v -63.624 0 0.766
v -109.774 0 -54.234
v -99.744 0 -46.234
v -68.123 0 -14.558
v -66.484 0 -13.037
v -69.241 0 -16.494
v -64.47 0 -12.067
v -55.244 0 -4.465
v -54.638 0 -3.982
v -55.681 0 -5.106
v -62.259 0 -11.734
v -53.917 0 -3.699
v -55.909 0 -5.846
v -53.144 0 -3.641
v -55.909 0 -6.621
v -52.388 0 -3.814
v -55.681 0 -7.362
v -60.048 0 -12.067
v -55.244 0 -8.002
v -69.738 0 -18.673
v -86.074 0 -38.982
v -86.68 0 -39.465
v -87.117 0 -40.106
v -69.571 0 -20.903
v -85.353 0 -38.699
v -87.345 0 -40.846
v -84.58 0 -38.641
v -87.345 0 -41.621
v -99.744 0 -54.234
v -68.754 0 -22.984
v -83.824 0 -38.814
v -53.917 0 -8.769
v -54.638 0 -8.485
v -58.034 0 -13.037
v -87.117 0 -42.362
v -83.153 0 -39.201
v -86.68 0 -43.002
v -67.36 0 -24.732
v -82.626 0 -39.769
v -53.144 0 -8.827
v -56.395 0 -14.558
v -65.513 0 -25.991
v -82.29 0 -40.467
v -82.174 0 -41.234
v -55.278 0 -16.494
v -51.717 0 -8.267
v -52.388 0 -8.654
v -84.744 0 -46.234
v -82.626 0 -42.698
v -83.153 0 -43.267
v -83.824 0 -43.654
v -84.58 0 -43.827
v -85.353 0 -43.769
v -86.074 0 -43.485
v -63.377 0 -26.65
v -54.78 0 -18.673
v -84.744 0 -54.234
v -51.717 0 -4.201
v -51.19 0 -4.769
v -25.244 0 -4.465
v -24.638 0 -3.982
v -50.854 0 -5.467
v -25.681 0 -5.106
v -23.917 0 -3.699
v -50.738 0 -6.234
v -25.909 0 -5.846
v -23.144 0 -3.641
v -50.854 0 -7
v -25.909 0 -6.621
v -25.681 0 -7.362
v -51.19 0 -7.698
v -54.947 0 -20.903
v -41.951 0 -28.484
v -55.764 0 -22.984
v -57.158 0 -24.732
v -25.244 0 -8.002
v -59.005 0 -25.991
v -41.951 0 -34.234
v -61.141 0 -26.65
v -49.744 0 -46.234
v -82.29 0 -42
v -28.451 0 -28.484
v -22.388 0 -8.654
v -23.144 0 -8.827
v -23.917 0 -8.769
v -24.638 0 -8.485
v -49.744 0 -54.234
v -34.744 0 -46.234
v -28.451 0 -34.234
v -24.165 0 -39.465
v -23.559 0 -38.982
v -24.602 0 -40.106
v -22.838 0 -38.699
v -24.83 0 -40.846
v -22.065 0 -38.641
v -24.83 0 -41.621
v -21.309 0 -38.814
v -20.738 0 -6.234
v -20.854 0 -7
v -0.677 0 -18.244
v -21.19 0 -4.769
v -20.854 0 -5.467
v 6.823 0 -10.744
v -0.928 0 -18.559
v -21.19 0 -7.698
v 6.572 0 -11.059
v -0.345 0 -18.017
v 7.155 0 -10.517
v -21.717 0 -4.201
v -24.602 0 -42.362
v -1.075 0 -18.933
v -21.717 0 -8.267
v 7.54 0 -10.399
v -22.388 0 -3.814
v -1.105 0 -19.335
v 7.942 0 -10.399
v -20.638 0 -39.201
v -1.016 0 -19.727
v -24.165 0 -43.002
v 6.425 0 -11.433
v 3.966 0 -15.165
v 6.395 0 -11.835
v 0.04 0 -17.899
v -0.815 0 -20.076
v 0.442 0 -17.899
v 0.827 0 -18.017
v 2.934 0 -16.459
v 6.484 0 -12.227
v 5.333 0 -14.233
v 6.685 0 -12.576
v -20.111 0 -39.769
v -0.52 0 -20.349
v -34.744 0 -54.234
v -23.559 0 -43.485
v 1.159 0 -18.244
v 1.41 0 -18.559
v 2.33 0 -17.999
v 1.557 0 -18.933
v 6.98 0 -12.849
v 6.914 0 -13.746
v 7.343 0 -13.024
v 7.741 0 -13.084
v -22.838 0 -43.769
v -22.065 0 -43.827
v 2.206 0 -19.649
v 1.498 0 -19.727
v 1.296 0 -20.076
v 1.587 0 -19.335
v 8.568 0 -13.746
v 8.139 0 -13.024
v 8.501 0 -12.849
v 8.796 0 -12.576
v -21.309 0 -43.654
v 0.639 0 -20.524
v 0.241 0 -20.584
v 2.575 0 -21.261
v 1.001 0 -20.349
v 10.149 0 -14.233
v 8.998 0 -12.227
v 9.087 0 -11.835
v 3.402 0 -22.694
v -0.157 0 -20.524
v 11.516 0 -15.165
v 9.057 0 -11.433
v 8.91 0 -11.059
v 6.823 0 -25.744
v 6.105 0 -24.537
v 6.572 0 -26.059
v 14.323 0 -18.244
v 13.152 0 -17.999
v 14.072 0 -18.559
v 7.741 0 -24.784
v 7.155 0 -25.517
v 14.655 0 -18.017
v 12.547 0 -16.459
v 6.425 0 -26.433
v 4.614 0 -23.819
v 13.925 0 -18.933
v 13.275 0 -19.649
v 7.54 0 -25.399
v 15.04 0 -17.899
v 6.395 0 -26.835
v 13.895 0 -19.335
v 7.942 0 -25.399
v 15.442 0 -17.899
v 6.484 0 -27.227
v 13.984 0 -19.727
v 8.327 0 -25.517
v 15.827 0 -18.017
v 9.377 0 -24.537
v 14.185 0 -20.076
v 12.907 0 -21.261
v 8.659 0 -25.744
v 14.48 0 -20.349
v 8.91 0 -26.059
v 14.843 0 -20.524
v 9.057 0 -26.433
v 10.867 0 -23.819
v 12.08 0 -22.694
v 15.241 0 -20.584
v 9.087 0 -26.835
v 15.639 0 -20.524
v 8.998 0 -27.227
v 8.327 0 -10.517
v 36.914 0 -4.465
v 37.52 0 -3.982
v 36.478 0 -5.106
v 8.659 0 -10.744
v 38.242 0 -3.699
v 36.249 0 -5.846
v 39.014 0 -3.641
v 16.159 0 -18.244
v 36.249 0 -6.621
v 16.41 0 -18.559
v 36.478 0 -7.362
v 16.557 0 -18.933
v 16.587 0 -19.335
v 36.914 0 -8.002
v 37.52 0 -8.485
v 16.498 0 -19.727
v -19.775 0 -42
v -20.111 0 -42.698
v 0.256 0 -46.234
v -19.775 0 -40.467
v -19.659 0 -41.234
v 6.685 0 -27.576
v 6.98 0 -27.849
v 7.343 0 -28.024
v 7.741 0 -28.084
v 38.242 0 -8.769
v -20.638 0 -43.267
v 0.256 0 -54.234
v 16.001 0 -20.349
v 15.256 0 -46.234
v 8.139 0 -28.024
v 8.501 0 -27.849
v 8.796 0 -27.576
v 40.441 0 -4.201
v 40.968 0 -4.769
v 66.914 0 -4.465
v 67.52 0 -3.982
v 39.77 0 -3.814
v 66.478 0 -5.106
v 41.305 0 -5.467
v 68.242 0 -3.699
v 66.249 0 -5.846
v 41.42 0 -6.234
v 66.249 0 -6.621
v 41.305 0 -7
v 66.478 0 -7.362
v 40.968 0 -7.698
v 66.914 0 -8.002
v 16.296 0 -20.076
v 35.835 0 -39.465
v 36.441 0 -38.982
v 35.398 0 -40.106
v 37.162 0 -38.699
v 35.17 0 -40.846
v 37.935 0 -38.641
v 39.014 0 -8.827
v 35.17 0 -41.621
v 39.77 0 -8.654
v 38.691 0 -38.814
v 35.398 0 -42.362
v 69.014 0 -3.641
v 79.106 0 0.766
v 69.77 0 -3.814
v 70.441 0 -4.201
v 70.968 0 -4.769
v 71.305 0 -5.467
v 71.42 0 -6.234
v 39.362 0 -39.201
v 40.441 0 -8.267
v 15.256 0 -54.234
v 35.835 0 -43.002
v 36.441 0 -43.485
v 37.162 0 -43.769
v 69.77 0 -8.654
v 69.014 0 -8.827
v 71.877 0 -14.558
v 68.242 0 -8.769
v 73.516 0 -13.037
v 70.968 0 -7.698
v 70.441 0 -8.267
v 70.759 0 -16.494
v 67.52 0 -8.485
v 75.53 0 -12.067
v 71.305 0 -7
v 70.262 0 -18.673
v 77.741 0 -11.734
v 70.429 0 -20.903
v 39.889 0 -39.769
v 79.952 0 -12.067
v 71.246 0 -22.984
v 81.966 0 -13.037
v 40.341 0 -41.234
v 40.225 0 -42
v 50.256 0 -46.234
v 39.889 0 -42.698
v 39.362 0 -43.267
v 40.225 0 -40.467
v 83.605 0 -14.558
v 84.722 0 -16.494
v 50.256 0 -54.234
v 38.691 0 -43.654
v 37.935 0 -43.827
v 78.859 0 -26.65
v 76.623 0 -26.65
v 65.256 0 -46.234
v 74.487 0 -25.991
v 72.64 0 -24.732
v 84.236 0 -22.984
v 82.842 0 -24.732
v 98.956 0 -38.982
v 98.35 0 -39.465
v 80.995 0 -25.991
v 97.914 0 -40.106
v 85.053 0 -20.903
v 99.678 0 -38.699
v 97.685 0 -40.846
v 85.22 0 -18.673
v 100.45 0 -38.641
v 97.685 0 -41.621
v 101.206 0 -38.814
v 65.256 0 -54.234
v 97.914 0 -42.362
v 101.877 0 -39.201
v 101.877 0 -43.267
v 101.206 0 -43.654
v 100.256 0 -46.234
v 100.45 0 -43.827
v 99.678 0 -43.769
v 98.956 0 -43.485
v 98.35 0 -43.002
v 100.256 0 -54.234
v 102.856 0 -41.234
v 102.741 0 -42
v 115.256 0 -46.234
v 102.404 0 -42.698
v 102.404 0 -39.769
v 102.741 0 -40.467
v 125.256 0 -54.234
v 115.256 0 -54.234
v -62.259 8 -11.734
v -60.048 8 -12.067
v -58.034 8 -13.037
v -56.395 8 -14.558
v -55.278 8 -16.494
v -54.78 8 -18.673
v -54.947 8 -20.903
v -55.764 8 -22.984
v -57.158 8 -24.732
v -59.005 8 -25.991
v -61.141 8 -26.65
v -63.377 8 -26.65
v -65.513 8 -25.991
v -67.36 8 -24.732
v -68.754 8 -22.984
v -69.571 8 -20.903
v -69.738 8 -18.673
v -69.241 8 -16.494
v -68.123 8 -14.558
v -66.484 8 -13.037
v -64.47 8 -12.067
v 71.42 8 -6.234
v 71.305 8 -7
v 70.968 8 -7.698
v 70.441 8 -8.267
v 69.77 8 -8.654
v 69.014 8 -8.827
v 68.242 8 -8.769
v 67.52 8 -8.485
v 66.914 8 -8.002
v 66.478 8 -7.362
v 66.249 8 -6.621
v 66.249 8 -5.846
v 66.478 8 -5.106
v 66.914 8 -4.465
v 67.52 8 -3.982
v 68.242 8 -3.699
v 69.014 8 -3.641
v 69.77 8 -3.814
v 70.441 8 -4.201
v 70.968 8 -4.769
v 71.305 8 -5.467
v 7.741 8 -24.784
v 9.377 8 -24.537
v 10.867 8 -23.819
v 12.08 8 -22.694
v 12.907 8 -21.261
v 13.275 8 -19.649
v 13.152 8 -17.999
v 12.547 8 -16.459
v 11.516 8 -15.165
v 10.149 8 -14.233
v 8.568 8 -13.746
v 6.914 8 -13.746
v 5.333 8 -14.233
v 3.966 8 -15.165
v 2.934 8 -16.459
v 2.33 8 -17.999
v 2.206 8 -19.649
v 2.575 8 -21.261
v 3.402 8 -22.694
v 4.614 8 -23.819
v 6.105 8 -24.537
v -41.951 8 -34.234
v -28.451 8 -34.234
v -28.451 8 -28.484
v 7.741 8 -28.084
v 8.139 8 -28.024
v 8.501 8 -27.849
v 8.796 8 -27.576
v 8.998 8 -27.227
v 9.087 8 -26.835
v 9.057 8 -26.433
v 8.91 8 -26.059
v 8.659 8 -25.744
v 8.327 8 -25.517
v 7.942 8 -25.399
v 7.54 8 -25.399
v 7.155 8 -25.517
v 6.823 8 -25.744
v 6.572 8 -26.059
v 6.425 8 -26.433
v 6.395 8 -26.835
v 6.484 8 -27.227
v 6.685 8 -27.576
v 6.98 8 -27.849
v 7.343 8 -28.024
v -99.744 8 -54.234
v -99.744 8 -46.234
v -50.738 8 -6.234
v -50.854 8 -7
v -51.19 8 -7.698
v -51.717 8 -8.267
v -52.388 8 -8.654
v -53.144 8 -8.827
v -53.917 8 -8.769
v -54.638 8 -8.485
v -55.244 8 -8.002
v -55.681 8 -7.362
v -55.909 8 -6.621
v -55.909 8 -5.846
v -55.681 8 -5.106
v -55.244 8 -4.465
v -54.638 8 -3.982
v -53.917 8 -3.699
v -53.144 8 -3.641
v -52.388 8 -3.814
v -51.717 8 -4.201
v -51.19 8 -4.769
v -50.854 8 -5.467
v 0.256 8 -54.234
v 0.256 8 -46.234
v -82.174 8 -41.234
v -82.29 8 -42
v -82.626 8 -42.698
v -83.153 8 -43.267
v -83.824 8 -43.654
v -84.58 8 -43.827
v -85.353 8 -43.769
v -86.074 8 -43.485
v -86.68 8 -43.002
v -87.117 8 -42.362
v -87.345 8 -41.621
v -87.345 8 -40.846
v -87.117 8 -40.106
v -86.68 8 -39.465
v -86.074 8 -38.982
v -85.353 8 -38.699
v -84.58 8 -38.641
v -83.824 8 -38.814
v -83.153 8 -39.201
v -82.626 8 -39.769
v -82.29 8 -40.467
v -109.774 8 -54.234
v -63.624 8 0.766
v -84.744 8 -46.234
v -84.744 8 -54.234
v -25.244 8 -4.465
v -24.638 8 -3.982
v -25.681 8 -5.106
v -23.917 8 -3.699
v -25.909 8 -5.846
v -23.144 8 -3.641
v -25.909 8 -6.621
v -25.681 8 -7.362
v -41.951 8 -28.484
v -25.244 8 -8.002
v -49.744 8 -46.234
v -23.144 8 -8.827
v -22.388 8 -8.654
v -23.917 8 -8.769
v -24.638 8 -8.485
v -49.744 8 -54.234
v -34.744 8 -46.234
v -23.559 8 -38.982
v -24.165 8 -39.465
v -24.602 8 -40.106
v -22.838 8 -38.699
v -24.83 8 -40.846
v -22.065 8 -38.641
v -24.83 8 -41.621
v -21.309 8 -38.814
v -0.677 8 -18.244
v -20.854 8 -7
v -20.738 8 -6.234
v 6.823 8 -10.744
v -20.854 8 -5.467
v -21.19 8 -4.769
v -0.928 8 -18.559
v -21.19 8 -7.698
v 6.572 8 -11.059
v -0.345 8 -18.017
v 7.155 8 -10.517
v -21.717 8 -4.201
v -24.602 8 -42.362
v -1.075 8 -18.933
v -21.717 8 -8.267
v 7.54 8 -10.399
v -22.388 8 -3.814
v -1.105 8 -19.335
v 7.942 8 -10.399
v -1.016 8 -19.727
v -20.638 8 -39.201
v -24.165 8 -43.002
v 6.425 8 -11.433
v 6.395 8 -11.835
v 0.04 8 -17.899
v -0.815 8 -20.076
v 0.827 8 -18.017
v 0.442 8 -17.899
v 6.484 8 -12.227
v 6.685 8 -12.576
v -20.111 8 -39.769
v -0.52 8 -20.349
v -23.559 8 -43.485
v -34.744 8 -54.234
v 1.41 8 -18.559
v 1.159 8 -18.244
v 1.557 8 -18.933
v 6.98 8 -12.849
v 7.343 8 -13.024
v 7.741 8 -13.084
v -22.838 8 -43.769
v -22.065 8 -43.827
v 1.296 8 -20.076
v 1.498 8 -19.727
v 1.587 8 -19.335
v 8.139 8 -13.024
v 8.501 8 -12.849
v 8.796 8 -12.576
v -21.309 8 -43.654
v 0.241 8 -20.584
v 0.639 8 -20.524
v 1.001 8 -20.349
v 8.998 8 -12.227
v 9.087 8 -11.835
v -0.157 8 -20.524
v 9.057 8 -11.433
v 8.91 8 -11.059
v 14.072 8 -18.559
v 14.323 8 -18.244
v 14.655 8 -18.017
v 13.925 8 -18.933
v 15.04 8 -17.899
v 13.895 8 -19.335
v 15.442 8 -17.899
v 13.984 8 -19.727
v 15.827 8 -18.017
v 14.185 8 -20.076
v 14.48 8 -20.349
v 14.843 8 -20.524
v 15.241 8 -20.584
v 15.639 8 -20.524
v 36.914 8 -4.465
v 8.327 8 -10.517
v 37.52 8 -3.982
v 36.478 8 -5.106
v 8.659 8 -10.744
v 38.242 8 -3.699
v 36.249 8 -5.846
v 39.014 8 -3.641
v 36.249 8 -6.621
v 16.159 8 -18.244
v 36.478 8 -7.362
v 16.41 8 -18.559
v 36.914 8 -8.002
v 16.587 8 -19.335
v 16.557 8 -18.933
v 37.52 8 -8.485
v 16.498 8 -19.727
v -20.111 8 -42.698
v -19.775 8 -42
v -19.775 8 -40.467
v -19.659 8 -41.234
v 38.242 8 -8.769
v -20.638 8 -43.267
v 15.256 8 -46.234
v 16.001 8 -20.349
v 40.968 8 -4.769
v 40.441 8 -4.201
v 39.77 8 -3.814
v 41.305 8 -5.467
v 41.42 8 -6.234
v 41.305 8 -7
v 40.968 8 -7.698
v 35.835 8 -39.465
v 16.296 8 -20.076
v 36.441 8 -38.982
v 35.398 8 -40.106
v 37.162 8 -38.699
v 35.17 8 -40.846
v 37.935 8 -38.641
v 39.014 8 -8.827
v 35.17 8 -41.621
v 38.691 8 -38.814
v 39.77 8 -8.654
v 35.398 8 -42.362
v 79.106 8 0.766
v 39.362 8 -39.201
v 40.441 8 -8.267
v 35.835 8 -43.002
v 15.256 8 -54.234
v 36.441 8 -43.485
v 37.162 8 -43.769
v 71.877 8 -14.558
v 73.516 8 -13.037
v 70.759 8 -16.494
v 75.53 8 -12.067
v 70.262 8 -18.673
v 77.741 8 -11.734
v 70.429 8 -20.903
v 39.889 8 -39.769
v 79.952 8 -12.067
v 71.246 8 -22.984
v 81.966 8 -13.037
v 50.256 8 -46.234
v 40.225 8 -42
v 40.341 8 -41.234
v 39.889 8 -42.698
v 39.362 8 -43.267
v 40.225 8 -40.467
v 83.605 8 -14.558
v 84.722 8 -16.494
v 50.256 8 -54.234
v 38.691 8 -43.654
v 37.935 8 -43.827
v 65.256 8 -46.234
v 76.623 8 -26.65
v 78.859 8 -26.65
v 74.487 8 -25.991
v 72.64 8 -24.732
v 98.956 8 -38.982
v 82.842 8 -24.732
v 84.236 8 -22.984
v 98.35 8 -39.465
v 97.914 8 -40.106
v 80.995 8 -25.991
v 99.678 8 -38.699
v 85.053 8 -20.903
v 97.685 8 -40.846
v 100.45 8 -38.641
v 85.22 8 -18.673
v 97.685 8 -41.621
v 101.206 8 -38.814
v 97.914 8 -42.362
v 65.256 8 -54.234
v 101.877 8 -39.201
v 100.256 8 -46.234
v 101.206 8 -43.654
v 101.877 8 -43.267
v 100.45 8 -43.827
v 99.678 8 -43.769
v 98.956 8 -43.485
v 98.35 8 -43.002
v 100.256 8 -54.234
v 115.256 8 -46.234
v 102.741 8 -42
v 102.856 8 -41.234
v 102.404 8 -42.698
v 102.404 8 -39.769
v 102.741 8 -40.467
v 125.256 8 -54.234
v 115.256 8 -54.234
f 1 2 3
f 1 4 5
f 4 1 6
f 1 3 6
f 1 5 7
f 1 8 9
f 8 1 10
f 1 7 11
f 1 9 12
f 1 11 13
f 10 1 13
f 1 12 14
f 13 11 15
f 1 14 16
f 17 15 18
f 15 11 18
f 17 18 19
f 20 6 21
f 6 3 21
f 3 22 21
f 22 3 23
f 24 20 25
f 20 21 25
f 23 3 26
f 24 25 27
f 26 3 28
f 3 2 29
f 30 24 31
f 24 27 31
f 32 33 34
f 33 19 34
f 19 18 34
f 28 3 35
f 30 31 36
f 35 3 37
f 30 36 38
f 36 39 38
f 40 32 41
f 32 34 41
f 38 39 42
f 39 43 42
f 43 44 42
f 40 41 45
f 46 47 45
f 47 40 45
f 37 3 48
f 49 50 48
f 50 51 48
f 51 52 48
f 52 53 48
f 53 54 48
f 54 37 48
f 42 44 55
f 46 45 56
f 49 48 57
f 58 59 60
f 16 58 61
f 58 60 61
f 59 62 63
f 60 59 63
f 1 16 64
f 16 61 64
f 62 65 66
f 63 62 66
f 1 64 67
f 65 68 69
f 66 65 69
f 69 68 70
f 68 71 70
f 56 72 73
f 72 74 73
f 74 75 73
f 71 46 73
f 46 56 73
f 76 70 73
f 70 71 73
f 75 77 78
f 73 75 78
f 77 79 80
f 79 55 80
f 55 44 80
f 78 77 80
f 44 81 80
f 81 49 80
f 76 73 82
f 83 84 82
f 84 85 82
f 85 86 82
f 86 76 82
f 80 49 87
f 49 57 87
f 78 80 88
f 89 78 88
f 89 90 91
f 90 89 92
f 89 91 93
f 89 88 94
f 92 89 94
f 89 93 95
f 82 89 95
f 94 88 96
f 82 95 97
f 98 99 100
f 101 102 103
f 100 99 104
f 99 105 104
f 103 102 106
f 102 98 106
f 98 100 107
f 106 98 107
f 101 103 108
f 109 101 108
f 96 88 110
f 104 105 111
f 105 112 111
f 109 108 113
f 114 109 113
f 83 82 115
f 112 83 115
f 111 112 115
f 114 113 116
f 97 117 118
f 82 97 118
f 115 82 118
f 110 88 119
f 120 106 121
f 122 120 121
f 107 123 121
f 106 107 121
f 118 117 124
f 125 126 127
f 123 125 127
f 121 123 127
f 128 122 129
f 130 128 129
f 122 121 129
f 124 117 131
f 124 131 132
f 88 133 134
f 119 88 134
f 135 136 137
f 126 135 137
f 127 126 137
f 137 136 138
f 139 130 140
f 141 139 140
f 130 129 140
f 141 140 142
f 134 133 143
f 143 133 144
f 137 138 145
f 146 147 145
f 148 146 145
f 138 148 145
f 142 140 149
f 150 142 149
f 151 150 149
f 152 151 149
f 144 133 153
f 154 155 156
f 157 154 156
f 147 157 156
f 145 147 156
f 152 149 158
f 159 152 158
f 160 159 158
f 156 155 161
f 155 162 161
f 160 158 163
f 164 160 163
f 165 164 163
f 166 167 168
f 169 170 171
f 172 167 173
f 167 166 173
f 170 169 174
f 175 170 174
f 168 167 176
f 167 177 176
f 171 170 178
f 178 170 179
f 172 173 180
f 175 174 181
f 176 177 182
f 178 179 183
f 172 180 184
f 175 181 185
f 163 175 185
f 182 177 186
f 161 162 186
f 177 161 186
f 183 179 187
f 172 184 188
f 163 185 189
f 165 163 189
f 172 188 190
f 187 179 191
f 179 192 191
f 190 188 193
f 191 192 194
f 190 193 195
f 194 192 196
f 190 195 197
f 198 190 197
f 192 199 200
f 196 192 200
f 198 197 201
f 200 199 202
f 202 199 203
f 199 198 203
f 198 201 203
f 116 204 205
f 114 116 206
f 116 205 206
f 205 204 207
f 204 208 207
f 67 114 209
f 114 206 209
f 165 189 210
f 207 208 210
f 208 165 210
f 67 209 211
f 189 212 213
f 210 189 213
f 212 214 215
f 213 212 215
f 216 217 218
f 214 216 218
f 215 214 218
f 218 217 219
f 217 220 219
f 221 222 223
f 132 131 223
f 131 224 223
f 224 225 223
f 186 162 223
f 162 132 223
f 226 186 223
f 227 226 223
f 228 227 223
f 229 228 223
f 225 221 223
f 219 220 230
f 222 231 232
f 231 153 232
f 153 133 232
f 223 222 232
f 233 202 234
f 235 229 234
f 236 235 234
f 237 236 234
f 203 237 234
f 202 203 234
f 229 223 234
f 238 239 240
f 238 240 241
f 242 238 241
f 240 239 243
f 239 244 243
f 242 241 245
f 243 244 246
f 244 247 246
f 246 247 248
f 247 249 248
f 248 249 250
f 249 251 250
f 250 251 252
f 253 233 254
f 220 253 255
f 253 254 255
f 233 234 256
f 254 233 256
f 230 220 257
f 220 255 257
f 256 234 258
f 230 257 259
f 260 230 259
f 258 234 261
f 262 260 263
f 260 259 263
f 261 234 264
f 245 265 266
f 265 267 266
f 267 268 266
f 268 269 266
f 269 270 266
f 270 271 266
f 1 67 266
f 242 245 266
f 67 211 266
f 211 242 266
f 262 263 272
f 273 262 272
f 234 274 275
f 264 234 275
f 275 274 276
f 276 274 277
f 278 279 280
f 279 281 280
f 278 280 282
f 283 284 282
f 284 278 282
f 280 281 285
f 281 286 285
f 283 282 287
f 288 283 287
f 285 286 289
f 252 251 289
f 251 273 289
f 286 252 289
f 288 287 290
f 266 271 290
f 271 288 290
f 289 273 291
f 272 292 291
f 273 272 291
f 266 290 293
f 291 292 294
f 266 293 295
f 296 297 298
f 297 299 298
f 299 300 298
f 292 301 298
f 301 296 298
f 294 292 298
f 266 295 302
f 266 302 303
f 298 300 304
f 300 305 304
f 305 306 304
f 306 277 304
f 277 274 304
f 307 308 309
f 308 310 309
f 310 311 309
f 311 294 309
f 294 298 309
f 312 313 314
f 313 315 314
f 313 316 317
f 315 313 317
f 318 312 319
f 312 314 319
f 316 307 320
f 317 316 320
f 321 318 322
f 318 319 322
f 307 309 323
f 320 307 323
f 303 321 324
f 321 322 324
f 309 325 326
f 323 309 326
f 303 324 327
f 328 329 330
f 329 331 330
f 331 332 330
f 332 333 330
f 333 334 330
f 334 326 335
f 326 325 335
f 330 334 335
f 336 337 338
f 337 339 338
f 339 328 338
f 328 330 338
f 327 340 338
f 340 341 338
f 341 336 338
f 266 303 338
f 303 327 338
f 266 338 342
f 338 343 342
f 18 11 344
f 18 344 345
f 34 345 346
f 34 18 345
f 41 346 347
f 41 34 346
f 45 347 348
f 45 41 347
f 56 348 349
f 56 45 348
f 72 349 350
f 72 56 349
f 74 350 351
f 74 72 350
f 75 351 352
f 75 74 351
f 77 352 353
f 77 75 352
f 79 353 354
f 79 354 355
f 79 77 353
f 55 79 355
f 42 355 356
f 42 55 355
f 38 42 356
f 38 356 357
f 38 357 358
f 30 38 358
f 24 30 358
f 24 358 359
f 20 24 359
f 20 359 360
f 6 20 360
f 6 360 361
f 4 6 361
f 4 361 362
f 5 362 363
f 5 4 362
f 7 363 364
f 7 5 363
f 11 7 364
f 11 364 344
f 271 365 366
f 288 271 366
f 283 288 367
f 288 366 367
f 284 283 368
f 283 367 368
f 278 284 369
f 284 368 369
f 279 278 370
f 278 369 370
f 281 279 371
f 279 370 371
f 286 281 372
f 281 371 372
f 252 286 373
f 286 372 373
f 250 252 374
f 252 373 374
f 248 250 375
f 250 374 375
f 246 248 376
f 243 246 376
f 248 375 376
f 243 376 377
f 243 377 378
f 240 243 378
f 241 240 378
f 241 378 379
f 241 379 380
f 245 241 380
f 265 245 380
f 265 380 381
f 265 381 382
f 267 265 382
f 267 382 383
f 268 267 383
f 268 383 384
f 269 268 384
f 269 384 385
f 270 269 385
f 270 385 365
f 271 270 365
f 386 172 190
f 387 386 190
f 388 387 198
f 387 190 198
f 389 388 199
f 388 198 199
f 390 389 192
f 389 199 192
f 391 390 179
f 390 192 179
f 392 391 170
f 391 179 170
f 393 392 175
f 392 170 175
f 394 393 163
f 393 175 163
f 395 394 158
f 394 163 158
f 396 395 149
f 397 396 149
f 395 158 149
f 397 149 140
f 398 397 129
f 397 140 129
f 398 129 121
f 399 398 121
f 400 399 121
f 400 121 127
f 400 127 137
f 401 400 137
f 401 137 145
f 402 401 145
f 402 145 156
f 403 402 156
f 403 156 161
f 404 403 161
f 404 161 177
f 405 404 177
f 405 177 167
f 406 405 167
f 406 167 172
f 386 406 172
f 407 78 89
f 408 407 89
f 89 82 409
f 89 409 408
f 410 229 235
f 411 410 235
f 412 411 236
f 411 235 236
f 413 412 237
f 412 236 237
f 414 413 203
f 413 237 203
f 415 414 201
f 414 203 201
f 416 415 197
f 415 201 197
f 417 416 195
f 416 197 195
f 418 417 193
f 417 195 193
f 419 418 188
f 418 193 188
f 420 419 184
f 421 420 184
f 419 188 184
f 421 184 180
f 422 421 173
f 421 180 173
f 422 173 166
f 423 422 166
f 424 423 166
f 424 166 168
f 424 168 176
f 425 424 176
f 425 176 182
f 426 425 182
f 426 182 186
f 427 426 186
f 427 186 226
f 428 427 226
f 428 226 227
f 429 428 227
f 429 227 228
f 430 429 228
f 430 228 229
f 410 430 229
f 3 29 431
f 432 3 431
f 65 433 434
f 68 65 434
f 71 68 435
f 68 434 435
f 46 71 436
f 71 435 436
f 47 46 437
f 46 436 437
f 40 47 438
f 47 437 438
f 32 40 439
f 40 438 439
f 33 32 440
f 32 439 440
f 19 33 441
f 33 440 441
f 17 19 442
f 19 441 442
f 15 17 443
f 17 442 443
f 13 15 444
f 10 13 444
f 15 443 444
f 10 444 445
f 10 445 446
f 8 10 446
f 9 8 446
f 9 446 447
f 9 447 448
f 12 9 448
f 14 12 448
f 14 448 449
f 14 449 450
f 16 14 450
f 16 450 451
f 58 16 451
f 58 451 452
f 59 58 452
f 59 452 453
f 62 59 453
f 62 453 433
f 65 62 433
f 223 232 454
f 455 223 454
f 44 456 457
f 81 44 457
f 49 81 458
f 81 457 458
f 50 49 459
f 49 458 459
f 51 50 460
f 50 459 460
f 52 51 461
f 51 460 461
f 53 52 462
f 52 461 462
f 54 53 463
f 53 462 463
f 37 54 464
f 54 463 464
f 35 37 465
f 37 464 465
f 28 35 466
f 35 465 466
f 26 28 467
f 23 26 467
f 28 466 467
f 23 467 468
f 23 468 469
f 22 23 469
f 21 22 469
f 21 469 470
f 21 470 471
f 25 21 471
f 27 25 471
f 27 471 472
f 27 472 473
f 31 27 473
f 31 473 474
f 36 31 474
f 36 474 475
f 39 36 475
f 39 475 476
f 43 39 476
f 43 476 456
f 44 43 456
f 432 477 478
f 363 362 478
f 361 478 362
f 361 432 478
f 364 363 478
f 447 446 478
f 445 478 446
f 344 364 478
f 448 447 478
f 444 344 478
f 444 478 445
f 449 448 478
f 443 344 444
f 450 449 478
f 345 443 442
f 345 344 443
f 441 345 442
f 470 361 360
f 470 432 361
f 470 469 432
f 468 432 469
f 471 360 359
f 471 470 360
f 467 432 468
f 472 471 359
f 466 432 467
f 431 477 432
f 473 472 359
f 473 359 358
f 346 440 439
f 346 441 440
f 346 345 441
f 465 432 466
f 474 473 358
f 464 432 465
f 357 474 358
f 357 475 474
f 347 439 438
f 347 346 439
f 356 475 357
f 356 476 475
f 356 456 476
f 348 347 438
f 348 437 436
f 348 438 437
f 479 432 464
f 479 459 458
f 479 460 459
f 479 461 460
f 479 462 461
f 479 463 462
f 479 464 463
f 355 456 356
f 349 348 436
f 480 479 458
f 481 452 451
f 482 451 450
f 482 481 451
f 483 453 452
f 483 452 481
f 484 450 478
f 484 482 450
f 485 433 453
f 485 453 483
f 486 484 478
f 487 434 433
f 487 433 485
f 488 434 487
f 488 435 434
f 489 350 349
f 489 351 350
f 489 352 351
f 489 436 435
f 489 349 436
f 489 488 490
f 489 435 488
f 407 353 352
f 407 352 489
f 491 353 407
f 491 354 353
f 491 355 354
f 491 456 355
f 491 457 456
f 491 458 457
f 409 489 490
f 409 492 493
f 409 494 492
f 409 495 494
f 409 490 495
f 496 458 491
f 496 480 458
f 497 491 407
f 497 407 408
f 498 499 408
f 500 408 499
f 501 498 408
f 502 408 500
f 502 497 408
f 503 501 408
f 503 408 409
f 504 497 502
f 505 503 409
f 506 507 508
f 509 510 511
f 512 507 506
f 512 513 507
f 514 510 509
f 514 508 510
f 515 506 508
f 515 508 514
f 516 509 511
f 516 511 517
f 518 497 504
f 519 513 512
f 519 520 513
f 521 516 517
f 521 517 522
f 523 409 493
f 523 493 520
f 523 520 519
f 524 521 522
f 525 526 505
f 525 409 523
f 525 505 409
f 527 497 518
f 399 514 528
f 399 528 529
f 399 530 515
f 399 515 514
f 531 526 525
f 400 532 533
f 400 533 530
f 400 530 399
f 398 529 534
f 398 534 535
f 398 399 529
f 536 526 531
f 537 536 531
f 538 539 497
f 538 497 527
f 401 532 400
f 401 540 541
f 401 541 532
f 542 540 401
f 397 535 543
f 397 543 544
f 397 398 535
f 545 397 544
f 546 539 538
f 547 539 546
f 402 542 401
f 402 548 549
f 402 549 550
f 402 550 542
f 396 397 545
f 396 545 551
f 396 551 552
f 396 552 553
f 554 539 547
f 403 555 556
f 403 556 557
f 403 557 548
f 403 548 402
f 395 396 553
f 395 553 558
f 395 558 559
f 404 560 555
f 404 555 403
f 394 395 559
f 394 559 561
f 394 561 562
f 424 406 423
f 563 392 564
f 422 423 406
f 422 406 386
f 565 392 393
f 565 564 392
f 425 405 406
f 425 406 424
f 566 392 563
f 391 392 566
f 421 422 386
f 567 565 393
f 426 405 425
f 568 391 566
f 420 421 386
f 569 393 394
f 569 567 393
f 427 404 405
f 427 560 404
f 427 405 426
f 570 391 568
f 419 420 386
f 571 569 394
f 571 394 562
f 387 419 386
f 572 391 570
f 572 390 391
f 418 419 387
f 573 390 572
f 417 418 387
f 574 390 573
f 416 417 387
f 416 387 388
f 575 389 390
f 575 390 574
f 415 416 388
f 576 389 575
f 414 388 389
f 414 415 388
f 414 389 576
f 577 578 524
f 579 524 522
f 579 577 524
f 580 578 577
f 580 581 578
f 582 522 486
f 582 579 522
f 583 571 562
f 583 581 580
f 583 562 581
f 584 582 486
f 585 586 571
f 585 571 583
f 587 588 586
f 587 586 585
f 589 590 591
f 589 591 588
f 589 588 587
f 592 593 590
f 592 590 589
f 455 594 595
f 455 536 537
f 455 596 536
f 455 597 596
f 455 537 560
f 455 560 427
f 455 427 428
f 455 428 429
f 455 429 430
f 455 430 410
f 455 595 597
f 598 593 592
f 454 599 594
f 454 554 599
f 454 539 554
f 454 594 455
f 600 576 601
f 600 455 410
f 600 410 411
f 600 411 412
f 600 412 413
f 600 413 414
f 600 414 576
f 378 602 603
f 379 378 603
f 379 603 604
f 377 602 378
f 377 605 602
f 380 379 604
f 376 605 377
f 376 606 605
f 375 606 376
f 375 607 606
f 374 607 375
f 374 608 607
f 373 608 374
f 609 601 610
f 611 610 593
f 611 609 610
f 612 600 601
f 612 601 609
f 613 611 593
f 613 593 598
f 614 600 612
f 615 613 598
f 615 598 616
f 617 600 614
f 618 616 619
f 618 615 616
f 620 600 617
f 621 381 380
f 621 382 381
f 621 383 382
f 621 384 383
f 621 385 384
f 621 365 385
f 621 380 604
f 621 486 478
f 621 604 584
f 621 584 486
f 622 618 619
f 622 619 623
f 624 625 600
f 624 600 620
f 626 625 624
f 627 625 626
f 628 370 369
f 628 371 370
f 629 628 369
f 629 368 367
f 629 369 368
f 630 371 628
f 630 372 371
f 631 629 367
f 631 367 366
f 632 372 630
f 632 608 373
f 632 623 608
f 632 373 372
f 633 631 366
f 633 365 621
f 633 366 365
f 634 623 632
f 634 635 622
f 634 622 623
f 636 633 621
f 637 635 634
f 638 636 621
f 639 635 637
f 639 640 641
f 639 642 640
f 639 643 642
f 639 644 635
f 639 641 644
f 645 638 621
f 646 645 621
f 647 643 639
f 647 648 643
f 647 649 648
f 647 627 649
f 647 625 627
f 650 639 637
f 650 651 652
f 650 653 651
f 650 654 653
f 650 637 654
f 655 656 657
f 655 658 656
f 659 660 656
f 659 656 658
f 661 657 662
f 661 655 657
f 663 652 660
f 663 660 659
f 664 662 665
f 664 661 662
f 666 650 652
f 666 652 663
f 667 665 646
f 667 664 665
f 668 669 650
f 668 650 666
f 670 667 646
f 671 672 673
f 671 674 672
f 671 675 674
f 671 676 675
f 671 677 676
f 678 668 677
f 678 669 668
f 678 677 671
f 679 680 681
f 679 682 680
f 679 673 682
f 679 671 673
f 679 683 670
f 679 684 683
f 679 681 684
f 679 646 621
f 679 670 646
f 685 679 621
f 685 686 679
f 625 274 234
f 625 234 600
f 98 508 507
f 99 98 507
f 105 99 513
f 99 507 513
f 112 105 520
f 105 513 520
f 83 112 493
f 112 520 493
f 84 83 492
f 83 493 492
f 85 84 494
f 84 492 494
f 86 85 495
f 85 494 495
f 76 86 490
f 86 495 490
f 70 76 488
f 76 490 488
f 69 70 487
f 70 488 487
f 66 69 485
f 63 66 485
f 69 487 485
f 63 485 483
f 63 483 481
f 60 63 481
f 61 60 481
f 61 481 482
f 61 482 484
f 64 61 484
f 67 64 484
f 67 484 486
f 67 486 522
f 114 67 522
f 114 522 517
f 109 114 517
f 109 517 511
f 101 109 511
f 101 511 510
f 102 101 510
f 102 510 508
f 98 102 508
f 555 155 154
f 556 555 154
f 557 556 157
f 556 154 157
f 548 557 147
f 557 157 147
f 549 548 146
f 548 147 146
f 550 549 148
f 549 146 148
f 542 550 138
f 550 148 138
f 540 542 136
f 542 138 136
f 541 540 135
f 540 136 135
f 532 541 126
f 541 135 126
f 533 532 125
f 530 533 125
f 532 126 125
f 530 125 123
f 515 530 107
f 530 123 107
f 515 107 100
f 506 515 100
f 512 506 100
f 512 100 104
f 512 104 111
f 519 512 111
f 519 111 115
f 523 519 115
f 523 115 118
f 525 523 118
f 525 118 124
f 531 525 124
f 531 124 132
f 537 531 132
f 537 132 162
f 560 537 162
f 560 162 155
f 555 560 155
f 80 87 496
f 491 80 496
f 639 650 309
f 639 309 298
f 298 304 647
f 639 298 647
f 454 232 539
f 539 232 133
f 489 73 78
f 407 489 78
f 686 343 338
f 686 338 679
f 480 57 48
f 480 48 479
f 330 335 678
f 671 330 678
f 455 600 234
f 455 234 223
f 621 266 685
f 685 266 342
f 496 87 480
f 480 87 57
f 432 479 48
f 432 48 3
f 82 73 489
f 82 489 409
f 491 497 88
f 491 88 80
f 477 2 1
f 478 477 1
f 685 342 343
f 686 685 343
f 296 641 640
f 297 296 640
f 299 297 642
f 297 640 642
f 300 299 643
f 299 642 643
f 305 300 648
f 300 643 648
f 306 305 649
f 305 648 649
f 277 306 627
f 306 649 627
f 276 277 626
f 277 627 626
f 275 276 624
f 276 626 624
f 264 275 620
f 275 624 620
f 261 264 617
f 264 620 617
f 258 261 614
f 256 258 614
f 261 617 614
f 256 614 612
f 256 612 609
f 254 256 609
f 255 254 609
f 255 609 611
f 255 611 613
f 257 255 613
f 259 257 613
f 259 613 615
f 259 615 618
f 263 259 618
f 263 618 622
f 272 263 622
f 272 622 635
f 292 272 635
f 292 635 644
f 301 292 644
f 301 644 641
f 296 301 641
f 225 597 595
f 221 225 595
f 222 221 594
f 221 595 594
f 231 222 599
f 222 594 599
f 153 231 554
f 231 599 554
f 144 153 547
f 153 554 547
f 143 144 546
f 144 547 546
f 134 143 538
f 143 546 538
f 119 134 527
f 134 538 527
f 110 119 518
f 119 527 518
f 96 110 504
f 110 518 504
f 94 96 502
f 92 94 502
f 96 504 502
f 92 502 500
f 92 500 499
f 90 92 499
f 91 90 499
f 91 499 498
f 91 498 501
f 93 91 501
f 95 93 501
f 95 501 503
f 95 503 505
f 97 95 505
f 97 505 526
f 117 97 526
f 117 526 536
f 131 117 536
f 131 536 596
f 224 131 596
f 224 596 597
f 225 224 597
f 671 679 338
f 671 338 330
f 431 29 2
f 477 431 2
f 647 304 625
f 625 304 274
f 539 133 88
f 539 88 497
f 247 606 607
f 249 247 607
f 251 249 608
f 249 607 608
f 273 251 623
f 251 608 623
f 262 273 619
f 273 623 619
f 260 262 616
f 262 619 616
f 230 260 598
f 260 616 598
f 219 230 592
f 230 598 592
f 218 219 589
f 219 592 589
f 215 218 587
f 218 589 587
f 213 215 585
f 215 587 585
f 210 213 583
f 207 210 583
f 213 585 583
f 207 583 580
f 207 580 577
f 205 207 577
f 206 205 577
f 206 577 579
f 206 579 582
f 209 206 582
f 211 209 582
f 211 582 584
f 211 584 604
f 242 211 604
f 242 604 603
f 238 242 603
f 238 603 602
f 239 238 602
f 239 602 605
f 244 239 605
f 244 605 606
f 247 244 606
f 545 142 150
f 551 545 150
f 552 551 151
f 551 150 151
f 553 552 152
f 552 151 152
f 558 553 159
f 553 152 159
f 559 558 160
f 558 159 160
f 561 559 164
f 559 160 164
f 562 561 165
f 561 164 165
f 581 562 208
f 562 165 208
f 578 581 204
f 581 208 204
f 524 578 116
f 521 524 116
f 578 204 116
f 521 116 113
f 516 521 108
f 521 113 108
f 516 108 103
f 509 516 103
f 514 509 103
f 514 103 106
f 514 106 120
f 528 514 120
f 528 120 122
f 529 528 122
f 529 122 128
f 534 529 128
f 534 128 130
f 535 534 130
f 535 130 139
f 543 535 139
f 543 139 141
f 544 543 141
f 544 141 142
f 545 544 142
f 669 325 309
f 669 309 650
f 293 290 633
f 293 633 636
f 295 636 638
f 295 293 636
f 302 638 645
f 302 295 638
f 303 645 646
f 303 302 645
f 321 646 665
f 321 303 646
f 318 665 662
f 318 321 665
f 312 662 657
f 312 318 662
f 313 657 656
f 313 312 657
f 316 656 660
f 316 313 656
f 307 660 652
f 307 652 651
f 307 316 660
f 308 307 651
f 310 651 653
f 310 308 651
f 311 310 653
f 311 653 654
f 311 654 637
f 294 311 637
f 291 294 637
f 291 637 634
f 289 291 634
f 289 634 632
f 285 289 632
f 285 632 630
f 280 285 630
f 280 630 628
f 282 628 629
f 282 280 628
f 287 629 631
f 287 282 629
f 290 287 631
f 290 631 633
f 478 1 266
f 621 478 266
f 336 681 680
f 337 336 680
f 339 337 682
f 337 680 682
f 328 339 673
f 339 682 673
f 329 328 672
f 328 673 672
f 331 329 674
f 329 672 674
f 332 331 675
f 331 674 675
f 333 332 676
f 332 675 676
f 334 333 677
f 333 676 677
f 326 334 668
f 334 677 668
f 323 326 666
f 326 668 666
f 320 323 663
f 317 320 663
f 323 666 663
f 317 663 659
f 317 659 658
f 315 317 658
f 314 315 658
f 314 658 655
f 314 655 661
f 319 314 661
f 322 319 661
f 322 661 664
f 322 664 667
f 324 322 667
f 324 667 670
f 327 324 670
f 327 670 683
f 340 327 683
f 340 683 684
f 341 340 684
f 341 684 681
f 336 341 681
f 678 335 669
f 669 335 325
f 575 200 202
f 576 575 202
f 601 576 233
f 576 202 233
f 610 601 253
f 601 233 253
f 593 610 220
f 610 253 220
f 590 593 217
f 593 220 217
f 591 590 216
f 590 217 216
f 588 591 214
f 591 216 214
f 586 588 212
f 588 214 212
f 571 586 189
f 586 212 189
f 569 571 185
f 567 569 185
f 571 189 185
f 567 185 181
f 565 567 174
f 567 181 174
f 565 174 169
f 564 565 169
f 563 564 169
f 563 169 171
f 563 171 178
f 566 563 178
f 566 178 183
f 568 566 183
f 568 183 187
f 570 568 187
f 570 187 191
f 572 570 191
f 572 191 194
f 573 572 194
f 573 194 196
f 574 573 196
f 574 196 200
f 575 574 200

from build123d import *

# Parameters (mm, degrees)
IZIM1_R                              = 2.6821485
IZIM1_R_2                            = 2.780383132
IZIM1_R_3                            = 7.5
IZIM1_R_4                            = 5.187481638
IZIM1_W                              = 13.5
IZIM1_H                              = 5.75
IZIM1_R_5                            = 3.602615137
IZIM1_R_6                            = 4.041767392
Y_KSEKLIK_EKSTR_ZYON1_DEPTH          = 8
M5_HELISARMAL_I_IN_Z_VANA_MATKAB_2_D = 5.2
IZIM13_R                             = 5.55
IZIM13_R_2                           = 1.35
KES_EKSTR_ZYON5_DEPTH                = 10
IZIM14_W                             = 15
IZIM14_H                             = 8
KES_EKSTR_ZYON6_DEPTH                = 8


with BuildPart() as part:
    # Çizim1 → Yükseklik-Ekstrüzyon1 (new body)
    # profile 1 of 9: a face of its own
    with BuildSketch(Plane(origin=(0, 0, 0), x_dir=(1, 0, 0), z_dir=(0, 1, 0))):
        Polygon((-109.77435772, 54.233807267), (-63.623878006, -0.766192733), (7.740916272, -0.766192733), (79.105710549, -0.766192733), (125.256190264, 54.233807267), (7.740916272, 54.233807267), align=None)
        with Locations((-53.338342967, 6.233807267)):
            Circle(IZIM1_R, mode=Mode.SUBTRACT)
        with Locations((-23.338342967, 6.233807267)):
            Circle(IZIM1_R_2, mode=Mode.SUBTRACT)
        with Locations(Location((-62.259083728, 19.233807267, 0), (0, 0, 270))):
            Circle(IZIM1_R_3, mode=Mode.SUBTRACT)
        with Locations((38.820175511, 6.233807267)):
            Circle(IZIM1_R_2, mode=Mode.SUBTRACT)
        with Locations((68.820175511, 6.233807267)):
            Circle(IZIM1_R, mode=Mode.SUBTRACT)
        with Locations(Location((7.740916272, 19.233807267, 0), (0, 0, 270))):
            Circle(IZIM1_R_4, mode=Mode.SUBTRACT)
        with Locations(Location((77.740916272, 19.233807267, 0), (0, 0, 270))):
            Circle(IZIM1_R_3, mode=Mode.SUBTRACT)
        with Locations((-35.200733135, 31.358807267)):
            Rectangle(IZIM1_W, IZIM1_H, mode=Mode.SUBTRACT)
        with Locations((-84.77435772, 41.233807267)):
            Circle(IZIM1_R_5, mode=Mode.SUBTRACT)
        with Locations((-22.259083728, 41.233807267)):
            Circle(IZIM1_R_6, mode=Mode.SUBTRACT)
        with Locations((37.740916272, 41.233807267)):
            Circle(IZIM1_R_6, mode=Mode.SUBTRACT)
        with Locations((100.256190264, 41.233807267)):
            Circle(IZIM1_R_5, mode=Mode.SUBTRACT)
    # profile 2 of 9: a face of its own
    with BuildSketch(Plane(origin=(0, 0, 0), x_dir=(1, 0, 0), z_dir=(0, 1, 0))):
        with Locations((-84.77435772, 41.233807267)):
            Circle(IZIM1_R_5)
    # profile 3 of 9: a face of its own
    with BuildSketch(Plane(origin=(0, 0, 0), x_dir=(1, 0, 0), z_dir=(0, 1, 0))):
        with Locations((-22.259083728, 41.233807267)):
            Circle(IZIM1_R_6)
    # profile 4 of 9: a face of its own
    with BuildSketch(Plane(origin=(0, 0, 0), x_dir=(1, 0, 0), z_dir=(0, 1, 0))):
        with Locations((37.740916272, 41.233807267)):
            Circle(IZIM1_R_6)
    # profile 5 of 9: a face of its own
    with BuildSketch(Plane(origin=(0, 0, 0), x_dir=(1, 0, 0), z_dir=(0, 1, 0))):
        with Locations((100.256190264, 41.233807267)):
            Circle(IZIM1_R_5)
    # profile 6 of 9: a face of its own
    with BuildSketch(Plane(origin=(0, 0, 0), x_dir=(1, 0, 0), z_dir=(0, 1, 0))):
        with Locations((68.820175511, 6.233807267)):
            Circle(IZIM1_R)
    # profile 7 of 9: a face of its own
    with BuildSketch(Plane(origin=(0, 0, 0), x_dir=(1, 0, 0), z_dir=(0, 1, 0))):
        with Locations((38.820175511, 6.233807267)):
            Circle(IZIM1_R_2)
    # profile 8 of 9: a face of its own
    with BuildSketch(Plane(origin=(0, 0, 0), x_dir=(1, 0, 0), z_dir=(0, 1, 0))):
        with Locations((-53.338342967, 6.233807267)):
            Circle(IZIM1_R)
    # profile 9 of 9: a face of its own
    with BuildSketch(Plane(origin=(0, 0, 0), x_dir=(1, 0, 0), z_dir=(0, 1, 0))):
        with Locations((-23.338342967, 6.233807267)):
            Circle(IZIM1_R_2)
    extrude(amount=Y_KSEKLIK_EKSTR_ZYON1_DEPTH)

    # M5 Helisarmal için Zıvana matkabı2 (through all)
    with Locations(Plane(origin=(0, 0, 0), x_dir=(-1, 0, 0), z_dir=(0, -1, 0))):
        with Locations((-68.820175511, 6.233807267), (-38.820175511, 6.233807267), (-37.740916272, 41.233807267), (-100.256190264, 41.233807267), (22.259083728, 41.233807267), (23.338342967, 6.233807267), (53.338342967, 6.233807267), (84.77435772, 41.233807267)):
            Hole(M5_HELISARMAL_I_IN_Z_VANA_MATKAB_2_D / 2)

    # Çizim13 → Kes-Ekstrüzyon5 (cut)
    with BuildSketch(Plane.XZ):
        with Locations(Location((7.740916272, -19.233807267, 0), (0, 0, 270))):
            Circle(IZIM13_R)
        with Locations(Location((15.240916272, -19.233807267, 0), (0, 0, 270))):
            Circle(IZIM13_R_2)
        with Locations(Location((7.740916272, -26.733807267, 0), (0, 0, 270))):
            Circle(IZIM13_R_2)
        with Locations(Location((0.240916272, -19.233807267, 0), (0, 0, 270))):
            Circle(IZIM13_R_2)
        with Locations(Location((7.740916272, -11.733807267, 0), (0, 0, 270))):
            Circle(IZIM13_R_2)
    extrude(amount=-KES_EKSTR_ZYON5_DEPTH, mode=Mode.SUBTRACT)

    # Çizim14 → Kes-Ekstrüzyon6 (cut)
    with BuildSketch(Plane(origin=(0, 0, -54.233807267), x_dir=(-1, 0, 0), z_dir=(0, 0, -1))):
        with Locations((-107.756190264, 4)):
            Rectangle(IZIM14_W, IZIM14_H)
        with Locations((-57.756190264, 4)):
            Rectangle(IZIM14_W, IZIM14_H)
        with Locations((-7.756190264, 4)):
            Rectangle(IZIM14_W, IZIM14_H)
        with Locations((42.243809736, 4)):
            Rectangle(IZIM14_W, IZIM14_H)
        with Locations((92.243809736, 4)):
            Rectangle(IZIM14_W, IZIM14_H)
    extrude(amount=-KES_EKSTR_ZYON6_DEPTH, mode=Mode.SUBTRACT)


solid = part.part
